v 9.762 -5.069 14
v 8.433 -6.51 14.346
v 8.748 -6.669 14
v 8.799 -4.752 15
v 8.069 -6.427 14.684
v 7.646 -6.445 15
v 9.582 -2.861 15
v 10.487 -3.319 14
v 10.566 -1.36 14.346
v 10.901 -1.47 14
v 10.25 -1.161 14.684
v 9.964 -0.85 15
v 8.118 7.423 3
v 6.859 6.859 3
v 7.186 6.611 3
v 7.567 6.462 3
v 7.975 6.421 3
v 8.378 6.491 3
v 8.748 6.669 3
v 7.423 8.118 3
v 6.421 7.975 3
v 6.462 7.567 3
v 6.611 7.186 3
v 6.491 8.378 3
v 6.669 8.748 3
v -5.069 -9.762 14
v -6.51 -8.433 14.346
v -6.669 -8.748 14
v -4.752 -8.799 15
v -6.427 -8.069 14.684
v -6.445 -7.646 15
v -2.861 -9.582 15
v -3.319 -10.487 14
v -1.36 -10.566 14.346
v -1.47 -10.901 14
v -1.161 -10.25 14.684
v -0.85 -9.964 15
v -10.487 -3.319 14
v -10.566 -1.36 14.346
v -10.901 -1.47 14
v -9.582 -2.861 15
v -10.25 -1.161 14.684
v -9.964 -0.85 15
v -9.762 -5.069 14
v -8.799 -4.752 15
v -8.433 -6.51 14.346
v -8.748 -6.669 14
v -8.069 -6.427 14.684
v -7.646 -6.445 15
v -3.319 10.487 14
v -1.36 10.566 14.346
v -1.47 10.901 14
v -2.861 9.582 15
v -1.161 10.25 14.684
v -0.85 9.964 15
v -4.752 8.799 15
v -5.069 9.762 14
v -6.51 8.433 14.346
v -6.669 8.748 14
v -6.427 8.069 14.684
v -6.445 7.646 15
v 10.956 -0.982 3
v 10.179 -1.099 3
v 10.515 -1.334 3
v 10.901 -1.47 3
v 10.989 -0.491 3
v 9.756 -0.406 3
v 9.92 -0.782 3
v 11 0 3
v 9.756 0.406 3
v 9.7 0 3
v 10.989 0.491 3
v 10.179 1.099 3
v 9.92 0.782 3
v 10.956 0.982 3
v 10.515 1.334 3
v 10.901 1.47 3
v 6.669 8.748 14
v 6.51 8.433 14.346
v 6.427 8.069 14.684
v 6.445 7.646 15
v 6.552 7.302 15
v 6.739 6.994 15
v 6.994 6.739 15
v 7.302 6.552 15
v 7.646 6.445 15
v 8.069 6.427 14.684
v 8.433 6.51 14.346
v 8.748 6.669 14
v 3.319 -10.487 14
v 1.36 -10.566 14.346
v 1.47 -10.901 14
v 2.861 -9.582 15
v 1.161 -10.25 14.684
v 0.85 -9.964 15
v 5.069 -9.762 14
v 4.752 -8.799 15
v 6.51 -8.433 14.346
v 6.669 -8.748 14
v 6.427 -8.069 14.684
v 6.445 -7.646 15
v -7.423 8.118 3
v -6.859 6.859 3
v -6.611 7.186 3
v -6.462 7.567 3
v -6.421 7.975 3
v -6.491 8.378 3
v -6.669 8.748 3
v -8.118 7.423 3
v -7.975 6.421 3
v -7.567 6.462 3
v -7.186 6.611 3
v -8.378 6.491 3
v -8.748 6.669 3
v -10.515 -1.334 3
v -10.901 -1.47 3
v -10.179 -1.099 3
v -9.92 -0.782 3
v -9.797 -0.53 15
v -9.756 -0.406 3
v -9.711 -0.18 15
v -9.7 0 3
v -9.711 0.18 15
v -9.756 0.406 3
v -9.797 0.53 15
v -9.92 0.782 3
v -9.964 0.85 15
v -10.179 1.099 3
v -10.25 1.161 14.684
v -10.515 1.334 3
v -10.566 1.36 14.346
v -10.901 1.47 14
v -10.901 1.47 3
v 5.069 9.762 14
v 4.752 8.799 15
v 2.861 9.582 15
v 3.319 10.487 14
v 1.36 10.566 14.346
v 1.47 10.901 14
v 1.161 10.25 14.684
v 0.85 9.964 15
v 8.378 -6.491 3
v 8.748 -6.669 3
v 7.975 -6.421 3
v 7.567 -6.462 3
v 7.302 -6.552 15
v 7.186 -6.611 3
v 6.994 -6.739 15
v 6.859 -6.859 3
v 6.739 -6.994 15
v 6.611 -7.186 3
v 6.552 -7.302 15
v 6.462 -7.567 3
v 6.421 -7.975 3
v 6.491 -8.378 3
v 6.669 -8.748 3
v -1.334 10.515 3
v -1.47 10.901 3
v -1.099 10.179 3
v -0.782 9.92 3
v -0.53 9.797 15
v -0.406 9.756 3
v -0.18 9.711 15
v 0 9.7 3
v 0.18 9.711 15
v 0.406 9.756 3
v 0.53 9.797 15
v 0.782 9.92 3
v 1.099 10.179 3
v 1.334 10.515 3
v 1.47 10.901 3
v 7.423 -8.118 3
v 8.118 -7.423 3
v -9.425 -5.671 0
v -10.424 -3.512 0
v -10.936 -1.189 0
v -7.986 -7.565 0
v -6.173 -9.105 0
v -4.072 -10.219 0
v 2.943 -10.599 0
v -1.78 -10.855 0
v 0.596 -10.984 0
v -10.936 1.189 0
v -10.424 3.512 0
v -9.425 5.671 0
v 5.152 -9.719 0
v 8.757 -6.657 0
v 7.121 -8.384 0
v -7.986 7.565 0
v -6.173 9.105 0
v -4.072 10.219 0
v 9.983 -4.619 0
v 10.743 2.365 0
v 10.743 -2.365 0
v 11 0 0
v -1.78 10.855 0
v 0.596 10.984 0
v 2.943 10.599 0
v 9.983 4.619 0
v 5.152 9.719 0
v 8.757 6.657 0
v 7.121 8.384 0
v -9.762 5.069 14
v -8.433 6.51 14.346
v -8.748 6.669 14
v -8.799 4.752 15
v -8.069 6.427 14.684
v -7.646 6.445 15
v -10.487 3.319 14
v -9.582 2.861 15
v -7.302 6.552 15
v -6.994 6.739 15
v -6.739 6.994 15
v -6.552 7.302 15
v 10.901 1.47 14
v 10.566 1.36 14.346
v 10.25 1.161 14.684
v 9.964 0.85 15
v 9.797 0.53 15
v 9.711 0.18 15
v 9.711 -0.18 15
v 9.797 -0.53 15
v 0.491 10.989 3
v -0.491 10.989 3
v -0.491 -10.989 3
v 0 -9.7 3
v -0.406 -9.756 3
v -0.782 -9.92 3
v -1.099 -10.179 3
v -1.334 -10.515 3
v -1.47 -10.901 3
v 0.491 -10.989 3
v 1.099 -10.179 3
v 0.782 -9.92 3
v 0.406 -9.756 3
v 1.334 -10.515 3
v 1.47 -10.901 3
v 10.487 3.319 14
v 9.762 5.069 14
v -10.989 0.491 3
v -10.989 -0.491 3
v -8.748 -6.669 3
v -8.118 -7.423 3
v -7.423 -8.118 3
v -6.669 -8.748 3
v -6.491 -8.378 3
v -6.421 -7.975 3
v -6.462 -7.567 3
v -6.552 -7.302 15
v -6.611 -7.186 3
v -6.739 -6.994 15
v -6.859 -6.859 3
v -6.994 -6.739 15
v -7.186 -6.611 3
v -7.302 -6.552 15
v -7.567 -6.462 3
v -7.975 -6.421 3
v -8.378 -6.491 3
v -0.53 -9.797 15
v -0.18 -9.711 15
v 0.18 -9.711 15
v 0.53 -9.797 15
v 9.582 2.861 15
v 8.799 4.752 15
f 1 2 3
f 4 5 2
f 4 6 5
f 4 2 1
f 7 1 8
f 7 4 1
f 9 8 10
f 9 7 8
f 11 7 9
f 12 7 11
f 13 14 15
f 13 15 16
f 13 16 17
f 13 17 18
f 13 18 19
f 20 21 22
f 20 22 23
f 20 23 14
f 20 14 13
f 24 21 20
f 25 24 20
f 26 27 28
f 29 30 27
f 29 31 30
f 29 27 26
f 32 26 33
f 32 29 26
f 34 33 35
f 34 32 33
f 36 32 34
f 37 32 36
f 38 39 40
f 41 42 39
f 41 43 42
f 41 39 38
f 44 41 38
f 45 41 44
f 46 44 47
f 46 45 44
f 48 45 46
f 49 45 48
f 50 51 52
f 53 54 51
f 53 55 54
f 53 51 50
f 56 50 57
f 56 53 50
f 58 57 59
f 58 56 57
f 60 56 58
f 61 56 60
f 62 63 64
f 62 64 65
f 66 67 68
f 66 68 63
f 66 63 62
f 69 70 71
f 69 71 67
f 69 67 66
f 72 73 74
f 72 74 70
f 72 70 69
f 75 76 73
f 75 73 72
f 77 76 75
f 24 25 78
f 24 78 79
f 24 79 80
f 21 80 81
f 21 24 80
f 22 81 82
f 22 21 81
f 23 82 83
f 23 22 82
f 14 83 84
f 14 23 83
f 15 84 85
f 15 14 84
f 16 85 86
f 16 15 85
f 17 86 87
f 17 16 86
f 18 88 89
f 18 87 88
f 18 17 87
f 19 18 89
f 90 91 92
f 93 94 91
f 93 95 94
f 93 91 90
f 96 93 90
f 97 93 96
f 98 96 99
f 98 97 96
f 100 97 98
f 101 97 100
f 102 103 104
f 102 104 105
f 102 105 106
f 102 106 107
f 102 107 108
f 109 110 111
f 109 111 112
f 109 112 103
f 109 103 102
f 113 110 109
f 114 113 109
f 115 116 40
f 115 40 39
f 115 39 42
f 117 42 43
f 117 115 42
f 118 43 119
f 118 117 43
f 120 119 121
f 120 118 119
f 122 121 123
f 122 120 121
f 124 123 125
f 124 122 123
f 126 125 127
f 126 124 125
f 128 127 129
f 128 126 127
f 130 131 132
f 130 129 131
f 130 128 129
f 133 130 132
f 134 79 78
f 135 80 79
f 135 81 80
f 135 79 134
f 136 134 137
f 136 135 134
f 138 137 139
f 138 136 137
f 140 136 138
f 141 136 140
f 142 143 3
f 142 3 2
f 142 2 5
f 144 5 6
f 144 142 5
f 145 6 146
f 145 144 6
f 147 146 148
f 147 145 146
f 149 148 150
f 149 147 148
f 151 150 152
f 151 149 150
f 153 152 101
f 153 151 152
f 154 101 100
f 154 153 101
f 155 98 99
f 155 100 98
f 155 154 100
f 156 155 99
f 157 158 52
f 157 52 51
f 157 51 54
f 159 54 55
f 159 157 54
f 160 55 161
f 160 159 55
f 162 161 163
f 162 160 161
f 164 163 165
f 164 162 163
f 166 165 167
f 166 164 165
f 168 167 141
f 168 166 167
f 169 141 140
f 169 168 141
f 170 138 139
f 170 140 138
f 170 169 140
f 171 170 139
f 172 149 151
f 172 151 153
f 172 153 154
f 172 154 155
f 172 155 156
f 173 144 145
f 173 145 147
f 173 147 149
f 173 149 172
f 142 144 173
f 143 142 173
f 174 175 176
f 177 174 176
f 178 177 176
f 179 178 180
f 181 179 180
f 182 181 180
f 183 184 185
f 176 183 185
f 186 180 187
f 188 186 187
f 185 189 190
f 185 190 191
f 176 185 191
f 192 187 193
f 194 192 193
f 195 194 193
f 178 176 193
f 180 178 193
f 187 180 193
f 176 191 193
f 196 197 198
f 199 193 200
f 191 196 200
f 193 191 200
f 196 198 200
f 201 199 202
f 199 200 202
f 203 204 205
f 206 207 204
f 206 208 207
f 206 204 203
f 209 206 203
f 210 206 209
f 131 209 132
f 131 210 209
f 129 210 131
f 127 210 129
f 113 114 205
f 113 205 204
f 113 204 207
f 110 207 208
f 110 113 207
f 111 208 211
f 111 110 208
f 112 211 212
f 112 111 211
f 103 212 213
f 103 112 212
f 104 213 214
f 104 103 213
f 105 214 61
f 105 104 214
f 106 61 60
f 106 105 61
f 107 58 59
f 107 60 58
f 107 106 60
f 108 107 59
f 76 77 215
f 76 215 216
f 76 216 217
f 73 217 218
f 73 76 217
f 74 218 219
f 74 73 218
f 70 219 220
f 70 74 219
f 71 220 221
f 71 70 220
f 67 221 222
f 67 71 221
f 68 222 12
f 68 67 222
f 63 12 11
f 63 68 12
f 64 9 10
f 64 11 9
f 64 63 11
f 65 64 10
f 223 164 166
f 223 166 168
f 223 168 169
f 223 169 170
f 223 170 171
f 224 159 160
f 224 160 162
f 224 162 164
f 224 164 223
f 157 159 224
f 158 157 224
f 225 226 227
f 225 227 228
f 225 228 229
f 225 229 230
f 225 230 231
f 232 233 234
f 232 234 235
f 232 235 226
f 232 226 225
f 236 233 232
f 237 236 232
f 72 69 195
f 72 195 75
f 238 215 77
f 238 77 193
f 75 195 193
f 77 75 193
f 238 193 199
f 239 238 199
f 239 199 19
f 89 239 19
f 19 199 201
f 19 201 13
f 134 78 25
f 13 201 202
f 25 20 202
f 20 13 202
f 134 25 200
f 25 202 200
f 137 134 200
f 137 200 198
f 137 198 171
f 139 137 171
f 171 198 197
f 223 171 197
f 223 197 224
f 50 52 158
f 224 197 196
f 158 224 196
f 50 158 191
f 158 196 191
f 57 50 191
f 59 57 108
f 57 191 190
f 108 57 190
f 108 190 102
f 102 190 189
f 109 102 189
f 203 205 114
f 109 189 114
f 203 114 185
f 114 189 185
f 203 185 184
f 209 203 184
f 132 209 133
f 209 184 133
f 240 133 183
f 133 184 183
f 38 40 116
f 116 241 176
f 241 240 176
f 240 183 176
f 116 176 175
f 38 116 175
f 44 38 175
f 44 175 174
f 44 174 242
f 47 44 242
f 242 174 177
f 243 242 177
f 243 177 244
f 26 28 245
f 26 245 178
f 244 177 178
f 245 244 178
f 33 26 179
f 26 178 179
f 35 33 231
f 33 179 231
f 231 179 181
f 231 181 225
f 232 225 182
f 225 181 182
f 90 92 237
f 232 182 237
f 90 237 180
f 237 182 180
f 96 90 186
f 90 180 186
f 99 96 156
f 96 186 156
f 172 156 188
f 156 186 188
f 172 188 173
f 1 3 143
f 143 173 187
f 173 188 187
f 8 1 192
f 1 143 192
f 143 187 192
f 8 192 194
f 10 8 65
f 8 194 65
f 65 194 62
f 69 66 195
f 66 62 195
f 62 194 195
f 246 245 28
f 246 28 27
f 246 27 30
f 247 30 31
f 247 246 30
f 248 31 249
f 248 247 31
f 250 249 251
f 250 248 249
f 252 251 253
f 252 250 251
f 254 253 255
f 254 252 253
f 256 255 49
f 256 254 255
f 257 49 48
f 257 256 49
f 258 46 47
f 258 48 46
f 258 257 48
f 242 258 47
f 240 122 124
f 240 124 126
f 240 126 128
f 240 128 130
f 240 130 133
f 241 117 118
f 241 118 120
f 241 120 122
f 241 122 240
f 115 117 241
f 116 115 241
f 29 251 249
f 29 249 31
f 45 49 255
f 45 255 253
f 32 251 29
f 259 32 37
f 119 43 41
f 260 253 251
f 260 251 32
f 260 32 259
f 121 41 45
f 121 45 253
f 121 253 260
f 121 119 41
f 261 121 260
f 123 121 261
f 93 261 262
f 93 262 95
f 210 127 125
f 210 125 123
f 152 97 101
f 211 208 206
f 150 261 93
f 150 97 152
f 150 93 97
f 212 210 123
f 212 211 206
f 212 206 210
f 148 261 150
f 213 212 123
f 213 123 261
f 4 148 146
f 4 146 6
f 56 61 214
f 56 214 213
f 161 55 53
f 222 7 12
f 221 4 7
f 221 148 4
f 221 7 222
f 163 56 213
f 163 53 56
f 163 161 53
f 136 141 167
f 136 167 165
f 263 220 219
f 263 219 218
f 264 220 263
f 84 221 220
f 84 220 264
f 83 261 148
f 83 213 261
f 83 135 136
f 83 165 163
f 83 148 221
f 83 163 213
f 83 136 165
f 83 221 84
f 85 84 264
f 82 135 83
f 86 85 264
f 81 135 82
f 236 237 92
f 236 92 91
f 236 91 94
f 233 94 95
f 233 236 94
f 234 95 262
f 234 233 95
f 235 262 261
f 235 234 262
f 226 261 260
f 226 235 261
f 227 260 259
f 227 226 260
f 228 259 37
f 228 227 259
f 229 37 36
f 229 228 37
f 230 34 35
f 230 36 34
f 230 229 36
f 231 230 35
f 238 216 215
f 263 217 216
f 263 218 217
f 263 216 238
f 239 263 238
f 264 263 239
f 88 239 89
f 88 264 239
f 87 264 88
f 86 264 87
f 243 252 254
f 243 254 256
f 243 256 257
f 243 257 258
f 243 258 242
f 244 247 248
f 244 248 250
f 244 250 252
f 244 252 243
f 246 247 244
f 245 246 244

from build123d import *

# Parameters (mm, degrees)
CYLINDER001_R     = 1.5
CYLINDER001_DEPTH = 20
ARRAY_COUNT       = 8
CYLINDER_R        = 11
CYLINDER_DEPTH    = 15
CHAMFER_SIZE      = 1
CHAMFER001_SIZE   = 1
CHAMFER002_SIZE   = 1
CHAMFER003_SIZE   = 1
CHAMFER004_SIZE   = 1
CHAMFER005_SIZE   = 1
CHAMFER006_SIZE   = 1
CHAMFER007_SIZE   = 1


with BuildPart() as array:
    # Cylinder001 → Cylinder001 (new body)
    with BuildSketch(Plane(origin=(11.2, 0, 3), x_dir=(1, 0, 0), z_dir=(0, 0, 1))):
        Circle(CYLINDER001_R)
    extrude(amount=CYLINDER001_DEPTH)

    # Array: Array ×8 about axis
    array_axis = Axis((0, 0, 0), (0, 0, 1))


with BuildPart() as array_1:
    add(array.part)
    for i in range(1, ARRAY_COUNT):
        add(array.part.rotate(array_axis, i * 360 / ARRAY_COUNT))


with BuildPart() as chamfer007:
    # Cylinder → Cylinder (new body)
    with BuildSketch(Plane.XY):
        Circle(CYLINDER_R)
    extrude(amount=CYLINDER_DEPTH)

    # Cut: cut Array
    add(array_1.part, mode=Mode.SUBTRACT)

    # Chamfer
    chamfer_edges = [chamfer007.edges().sort_by_distance(p)[0] for p in [
        (4.209518, -10.162675, 15),
    ]]
    chamfer(chamfer_edges, length=CHAMFER_SIZE)

    # Chamfer001
    chamfer001_edges = [chamfer007.edges().sort_by_distance(p)[0] for p in [
        (10.162675, -4.209518, 15),
    ]]
    chamfer(chamfer001_edges, length=CHAMFER001_SIZE)

    # Chamfer002
    chamfer002_edges = [chamfer007.edges().sort_by_distance(p)[0] for p in [
        (10.162675, 4.209518, 15),
    ]]
    chamfer(chamfer002_edges, length=CHAMFER002_SIZE)

    # Chamfer003
    chamfer003_edges = [chamfer007.edges().sort_by_distance(p)[0] for p in [
        (4.209518, 10.162675, 15),
    ]]
    chamfer(chamfer003_edges, length=CHAMFER003_SIZE)

    # Chamfer004
    chamfer004_edges = [chamfer007.edges().sort_by_distance(p)[0] for p in [
        (-4.209518, 10.162675, 15),
    ]]
    chamfer(chamfer004_edges, length=CHAMFER004_SIZE)

    # Chamfer005
    chamfer005_edges = [chamfer007.edges().sort_by_distance(p)[0] for p in [
        (-10.162675, 4.209518, 15),
    ]]
    chamfer(chamfer005_edges, length=CHAMFER005_SIZE)

    # Chamfer006
    chamfer006_edges = [chamfer007.edges().sort_by_distance(p)[0] for p in [
        (-10.162675, -4.209518, 15),
    ]]
    chamfer(chamfer006_edges, length=CHAMFER006_SIZE)

    # Chamfer007
    chamfer007_edges = [chamfer007.edges().sort_by_distance(p)[0] for p in [
        (-4.209518, -10.162675, 15),
    ]]
    chamfer(chamfer007_edges, length=CHAMFER007_SIZE)


solid = chamfer007.part
